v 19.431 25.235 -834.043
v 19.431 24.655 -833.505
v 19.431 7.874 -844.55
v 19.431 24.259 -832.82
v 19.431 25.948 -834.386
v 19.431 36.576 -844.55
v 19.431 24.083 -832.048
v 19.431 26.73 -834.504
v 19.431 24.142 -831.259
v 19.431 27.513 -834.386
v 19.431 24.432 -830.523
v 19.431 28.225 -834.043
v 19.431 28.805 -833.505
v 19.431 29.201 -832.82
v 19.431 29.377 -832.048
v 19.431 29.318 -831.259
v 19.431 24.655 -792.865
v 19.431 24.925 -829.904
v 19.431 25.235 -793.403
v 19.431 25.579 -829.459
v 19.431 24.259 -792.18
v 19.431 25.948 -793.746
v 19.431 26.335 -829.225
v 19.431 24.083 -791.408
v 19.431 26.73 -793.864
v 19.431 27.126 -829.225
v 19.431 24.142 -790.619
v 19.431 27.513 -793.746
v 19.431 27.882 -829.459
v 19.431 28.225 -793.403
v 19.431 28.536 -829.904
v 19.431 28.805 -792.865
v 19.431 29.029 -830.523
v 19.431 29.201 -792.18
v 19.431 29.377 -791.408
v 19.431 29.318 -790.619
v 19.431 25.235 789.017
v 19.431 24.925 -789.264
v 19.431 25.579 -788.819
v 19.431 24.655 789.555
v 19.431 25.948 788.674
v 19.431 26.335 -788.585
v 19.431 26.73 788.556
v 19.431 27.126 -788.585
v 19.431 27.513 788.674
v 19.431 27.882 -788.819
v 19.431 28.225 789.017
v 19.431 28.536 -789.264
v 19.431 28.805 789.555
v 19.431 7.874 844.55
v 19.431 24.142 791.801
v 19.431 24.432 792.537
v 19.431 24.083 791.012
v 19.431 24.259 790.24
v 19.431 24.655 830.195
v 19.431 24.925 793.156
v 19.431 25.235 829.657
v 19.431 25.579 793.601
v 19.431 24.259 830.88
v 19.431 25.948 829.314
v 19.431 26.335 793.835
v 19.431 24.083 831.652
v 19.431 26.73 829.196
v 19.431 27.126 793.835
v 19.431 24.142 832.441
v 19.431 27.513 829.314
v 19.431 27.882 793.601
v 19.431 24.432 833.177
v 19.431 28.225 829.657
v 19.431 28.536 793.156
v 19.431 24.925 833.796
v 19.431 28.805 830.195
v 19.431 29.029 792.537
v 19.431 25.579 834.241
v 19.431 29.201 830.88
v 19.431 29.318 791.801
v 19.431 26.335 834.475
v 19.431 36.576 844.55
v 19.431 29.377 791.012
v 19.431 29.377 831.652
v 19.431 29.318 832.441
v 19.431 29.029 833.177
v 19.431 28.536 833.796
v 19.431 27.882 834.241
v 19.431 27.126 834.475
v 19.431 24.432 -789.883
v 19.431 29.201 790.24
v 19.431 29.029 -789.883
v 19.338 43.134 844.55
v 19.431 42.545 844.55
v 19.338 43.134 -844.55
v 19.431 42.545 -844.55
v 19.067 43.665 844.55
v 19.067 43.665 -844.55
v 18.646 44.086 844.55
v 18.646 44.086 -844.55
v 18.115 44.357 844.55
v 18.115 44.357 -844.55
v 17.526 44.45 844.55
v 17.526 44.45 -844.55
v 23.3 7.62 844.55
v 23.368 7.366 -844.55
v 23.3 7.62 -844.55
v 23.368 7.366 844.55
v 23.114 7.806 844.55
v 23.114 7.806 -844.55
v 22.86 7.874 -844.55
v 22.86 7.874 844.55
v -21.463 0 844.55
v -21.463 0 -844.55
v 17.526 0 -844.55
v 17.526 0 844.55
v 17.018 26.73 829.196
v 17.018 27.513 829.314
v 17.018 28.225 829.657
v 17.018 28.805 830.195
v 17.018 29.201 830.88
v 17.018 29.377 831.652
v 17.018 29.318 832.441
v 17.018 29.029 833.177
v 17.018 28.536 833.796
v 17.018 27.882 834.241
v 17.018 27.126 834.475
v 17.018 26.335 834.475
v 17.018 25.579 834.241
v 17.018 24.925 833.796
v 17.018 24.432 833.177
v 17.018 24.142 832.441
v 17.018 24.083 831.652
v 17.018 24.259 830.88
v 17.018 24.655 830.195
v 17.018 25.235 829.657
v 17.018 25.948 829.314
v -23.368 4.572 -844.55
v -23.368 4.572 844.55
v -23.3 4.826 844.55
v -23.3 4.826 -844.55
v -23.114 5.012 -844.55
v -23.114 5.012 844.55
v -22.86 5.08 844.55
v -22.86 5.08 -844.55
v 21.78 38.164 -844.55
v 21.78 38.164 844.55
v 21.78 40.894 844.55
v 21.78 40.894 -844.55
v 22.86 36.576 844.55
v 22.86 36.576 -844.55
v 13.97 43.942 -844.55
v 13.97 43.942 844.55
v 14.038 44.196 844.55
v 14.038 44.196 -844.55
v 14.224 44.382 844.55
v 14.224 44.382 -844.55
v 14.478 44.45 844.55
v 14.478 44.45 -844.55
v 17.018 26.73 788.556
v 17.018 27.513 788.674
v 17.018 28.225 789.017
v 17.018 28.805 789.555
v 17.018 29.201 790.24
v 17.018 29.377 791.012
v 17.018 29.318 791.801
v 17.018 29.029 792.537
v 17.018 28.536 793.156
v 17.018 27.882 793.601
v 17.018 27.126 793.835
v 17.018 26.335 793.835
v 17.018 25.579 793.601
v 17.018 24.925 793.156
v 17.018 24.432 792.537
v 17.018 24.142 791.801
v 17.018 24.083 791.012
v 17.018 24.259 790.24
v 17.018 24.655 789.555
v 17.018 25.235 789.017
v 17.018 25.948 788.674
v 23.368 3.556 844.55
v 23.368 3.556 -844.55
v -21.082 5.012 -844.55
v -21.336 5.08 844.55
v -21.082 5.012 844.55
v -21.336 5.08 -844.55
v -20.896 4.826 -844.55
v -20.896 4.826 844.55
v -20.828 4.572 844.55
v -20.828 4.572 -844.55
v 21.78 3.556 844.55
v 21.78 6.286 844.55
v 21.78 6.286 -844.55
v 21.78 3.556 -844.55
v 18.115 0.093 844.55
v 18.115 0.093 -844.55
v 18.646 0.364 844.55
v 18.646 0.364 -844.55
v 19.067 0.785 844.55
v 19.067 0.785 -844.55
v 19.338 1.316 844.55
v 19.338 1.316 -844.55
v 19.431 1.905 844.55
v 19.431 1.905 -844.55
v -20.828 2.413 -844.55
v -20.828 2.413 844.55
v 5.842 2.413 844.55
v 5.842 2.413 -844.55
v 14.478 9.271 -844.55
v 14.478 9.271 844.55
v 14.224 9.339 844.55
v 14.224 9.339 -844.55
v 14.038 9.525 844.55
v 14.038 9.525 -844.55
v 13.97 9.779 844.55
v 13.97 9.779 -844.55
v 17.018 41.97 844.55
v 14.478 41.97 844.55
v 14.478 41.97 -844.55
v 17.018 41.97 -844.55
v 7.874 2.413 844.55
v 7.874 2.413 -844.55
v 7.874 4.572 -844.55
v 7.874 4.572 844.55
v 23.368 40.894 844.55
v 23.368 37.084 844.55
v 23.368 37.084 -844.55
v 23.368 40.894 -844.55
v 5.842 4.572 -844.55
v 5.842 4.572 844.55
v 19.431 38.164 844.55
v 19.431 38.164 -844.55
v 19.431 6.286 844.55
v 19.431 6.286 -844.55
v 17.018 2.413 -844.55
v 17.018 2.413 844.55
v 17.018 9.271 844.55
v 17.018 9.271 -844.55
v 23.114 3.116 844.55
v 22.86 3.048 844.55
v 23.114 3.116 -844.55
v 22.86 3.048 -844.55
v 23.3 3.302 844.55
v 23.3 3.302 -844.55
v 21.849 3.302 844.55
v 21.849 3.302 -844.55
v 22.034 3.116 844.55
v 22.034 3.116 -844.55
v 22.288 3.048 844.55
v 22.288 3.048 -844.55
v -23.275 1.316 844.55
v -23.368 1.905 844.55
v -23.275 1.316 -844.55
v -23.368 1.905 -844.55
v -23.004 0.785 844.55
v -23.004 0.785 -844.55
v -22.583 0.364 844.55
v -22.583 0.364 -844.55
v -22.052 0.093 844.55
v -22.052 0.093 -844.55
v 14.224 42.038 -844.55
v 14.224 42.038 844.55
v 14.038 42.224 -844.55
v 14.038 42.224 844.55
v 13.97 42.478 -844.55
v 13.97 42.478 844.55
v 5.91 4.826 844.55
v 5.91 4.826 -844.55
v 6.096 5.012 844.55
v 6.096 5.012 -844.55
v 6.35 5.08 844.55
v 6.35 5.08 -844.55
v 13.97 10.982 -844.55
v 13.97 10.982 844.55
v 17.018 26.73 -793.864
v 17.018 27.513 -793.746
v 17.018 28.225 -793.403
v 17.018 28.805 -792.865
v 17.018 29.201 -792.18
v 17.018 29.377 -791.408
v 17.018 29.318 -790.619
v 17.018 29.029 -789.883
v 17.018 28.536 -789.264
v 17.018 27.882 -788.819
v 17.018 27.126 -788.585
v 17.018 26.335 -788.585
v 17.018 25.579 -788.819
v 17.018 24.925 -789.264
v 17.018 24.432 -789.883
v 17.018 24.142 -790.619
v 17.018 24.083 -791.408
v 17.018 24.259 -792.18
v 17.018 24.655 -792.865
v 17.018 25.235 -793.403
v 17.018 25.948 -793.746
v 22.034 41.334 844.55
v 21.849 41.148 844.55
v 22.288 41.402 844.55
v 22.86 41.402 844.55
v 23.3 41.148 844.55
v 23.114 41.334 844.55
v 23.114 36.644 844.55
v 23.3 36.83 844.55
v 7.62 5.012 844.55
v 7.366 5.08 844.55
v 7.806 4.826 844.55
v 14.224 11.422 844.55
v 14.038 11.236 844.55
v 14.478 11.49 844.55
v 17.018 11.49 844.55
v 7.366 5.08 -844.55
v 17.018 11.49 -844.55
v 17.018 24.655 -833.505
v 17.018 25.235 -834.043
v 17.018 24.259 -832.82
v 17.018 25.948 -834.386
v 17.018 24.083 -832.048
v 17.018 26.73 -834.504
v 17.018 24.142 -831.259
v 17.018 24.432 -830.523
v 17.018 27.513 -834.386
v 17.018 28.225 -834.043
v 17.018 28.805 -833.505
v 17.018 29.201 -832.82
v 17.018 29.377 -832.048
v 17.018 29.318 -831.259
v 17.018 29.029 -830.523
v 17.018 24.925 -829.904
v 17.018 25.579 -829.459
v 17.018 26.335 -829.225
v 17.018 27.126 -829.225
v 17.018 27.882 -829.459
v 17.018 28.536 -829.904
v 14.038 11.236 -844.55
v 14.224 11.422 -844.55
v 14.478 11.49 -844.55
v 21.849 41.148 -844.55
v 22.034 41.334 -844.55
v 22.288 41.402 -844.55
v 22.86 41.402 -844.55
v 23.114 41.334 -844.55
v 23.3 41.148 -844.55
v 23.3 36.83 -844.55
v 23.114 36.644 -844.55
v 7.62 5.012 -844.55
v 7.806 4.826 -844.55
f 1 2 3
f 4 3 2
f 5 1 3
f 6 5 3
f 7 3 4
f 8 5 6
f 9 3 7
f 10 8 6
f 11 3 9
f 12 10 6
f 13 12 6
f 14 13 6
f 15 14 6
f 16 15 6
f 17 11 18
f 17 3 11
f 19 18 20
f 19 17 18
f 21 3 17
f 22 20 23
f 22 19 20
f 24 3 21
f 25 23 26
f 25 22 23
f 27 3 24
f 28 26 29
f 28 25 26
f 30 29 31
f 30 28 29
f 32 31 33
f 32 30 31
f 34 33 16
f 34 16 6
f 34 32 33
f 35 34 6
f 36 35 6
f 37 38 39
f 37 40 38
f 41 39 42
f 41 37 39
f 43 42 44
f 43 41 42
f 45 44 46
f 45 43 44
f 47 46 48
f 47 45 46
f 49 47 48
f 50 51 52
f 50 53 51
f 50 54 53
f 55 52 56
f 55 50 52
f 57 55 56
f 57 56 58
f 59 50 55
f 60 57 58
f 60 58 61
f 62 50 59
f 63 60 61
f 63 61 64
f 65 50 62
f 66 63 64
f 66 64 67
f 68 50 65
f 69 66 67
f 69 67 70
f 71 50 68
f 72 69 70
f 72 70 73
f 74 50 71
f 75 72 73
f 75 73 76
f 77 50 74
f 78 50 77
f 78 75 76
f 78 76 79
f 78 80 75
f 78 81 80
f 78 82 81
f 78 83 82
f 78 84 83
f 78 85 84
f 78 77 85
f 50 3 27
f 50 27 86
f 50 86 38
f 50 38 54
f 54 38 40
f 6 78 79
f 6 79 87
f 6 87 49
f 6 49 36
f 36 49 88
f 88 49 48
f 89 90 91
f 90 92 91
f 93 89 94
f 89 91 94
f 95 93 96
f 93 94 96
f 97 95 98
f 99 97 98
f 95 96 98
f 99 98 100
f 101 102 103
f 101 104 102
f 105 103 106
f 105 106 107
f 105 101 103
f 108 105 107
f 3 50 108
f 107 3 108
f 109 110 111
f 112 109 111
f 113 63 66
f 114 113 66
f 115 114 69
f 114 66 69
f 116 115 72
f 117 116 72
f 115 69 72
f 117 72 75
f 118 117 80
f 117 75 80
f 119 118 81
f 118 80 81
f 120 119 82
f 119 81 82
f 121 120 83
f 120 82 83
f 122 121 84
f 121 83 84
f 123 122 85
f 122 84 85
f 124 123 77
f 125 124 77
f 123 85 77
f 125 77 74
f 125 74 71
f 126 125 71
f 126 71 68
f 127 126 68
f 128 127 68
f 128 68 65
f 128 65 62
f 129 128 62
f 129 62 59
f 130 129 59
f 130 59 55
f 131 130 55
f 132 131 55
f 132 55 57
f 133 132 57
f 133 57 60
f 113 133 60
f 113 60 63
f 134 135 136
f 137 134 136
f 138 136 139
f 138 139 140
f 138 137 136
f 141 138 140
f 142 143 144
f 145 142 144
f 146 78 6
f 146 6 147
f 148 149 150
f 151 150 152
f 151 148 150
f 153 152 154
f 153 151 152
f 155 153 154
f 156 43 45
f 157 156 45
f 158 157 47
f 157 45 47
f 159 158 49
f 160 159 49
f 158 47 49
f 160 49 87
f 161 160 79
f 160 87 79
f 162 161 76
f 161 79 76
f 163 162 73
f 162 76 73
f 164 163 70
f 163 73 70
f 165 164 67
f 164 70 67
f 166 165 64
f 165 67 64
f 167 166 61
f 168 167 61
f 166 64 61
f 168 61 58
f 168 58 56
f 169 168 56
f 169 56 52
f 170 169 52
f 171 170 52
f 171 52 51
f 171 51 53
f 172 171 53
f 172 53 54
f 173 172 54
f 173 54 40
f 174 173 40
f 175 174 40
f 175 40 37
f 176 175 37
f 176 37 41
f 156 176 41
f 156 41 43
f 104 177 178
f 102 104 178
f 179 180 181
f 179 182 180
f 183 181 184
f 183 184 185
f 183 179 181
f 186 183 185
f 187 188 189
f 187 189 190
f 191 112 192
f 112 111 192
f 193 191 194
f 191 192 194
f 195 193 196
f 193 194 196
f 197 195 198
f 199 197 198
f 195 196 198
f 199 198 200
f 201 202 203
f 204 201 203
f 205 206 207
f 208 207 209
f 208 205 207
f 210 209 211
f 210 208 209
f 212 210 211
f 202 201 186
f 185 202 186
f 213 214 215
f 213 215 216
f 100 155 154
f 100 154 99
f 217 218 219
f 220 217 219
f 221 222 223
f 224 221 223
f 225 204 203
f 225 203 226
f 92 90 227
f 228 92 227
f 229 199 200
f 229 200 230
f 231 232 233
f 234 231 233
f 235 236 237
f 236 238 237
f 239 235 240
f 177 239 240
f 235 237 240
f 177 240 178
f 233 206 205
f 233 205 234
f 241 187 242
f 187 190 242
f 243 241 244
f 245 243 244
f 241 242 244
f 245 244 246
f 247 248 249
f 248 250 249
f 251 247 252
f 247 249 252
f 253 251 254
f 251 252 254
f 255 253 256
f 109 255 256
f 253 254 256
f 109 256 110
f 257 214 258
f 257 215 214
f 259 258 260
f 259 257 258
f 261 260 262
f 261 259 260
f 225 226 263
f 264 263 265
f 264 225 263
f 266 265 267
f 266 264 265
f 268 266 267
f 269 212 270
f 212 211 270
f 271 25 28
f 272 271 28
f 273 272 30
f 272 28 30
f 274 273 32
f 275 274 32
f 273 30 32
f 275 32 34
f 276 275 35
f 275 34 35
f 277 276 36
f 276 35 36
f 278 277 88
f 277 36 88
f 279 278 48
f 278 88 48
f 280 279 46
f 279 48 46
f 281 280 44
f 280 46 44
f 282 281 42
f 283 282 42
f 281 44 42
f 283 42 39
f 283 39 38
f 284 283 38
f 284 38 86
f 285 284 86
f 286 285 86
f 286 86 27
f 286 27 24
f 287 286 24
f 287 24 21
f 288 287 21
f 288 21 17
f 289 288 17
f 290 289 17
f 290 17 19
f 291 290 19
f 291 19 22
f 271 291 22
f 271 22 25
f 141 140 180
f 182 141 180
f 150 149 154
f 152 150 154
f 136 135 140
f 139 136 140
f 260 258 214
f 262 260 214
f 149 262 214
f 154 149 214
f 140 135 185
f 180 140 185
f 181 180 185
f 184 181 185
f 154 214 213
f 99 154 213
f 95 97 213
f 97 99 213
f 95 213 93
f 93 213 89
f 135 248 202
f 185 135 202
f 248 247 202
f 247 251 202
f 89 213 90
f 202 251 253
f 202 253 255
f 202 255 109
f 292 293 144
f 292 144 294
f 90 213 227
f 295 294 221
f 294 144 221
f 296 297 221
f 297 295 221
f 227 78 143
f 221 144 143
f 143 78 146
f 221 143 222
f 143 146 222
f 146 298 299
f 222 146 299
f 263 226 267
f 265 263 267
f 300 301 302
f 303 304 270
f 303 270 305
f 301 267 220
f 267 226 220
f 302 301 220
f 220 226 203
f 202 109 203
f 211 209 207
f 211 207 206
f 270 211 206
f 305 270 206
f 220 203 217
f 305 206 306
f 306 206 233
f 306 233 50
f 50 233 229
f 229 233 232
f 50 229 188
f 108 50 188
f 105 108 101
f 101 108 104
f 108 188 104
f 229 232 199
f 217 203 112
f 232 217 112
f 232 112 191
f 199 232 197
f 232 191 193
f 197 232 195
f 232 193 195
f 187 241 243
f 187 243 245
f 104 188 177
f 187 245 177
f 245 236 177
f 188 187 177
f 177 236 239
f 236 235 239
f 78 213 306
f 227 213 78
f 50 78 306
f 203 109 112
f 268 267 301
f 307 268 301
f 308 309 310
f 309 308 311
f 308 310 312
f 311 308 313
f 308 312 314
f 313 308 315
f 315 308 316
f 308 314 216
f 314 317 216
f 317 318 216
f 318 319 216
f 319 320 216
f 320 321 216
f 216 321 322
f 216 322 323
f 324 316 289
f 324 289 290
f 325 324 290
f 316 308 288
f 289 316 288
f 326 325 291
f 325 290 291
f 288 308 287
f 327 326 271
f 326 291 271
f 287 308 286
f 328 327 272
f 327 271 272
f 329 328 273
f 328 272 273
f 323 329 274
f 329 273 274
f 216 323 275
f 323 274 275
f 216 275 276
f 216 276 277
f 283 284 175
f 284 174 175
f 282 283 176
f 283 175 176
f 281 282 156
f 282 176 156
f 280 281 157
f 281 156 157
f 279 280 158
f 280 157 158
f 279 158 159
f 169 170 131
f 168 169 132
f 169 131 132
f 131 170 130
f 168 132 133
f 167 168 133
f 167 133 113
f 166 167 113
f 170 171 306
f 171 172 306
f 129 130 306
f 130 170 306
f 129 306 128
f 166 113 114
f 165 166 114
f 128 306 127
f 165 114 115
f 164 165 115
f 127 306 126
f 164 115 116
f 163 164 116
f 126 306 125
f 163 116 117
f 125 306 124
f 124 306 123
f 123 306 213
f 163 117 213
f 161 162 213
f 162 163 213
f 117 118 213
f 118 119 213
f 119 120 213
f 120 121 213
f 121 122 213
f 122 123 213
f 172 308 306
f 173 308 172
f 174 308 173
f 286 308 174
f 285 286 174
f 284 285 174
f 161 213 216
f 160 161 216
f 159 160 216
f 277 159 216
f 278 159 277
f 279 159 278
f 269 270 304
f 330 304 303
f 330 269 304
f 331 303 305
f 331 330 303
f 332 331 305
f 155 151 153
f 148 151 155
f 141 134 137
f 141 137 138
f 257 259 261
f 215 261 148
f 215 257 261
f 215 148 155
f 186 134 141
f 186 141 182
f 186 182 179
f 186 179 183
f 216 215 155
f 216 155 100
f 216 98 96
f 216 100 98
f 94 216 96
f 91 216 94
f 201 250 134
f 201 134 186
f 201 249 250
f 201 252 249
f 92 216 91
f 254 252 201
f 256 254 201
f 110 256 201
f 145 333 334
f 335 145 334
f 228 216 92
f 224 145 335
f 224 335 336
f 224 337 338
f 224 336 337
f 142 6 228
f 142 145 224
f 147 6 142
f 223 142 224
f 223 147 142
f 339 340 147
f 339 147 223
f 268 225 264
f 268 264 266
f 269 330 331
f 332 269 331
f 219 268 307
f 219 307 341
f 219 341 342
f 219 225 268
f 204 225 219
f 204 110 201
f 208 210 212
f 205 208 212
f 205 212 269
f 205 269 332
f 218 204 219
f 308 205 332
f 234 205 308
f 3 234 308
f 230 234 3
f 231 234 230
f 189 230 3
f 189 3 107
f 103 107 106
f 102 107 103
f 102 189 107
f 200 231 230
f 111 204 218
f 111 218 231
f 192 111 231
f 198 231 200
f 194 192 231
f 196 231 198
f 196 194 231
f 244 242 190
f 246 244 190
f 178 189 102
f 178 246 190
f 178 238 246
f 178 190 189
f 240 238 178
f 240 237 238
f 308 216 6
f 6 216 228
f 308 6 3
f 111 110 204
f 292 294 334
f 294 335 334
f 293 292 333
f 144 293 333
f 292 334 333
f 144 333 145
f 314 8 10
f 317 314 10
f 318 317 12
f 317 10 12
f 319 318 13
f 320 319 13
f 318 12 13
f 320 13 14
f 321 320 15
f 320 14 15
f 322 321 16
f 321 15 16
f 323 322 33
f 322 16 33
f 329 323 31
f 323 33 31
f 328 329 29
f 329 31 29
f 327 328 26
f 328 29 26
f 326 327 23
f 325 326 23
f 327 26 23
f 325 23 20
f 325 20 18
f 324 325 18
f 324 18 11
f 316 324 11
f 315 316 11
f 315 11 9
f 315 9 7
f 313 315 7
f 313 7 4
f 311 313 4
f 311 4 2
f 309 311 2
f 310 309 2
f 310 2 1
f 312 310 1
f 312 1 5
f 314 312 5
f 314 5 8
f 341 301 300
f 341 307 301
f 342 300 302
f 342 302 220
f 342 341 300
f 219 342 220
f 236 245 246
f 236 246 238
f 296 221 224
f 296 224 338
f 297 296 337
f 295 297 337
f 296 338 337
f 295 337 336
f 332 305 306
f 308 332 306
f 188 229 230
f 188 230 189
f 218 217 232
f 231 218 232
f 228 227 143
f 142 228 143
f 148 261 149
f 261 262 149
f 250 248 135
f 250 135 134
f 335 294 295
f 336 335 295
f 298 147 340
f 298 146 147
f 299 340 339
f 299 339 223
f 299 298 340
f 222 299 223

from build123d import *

# Parameters (mm, degrees)
MAIN_W                 = 46.736
MAIN_H                 = 1689.1
EXTRUDE_MAIN_DEPTH     = 44.45
MAIN_CUT_W             = 37.338
MAIN_CUT_H             = 39.37
CUT_MAIN_DEPTH         = 1690.846346839
BOTTOM_LEFT_W          = 26.67
BOTTOM_LEFT_H          = 2.667
CUT_BOTTOM_LEFT_DEPTH  = 1690.846346839
BOTTOM_RIGHT_W         = 6.096
BOTTOM_RIGHT_H         = 2.667
CUT_BOTTOM_RIGHT_DEPTH = 1690.846346839
LEFT_BOTTOM_W          = 3.048
LEFT_BOTTOM_H          = 6.858
CUT_LEFT_BOTTOM_DEPTH  = 1690.846346839
LEFT_MIDDLE_W          = 3.048
LEFT_MIDDLE_H          = 30.48
CUT_LEFT_MID_DEPTH     = 1690.846346839
RIGHT_MIDDLE_W         = 7.874
RIGHT_MIDDLE_H         = 28.702
CUT_RIGHT_MID_DEPTH    = 1690.846346839
HOOK_CUT_DEPTH         = 1690.846346839
FILLET3_R              = 1.905
FILLET4_R              = 0.508
SCREW_HOLES_D          = 5.3086


with BuildPart() as part:
    # Main → Extrude-Main (new body)
    with BuildSketch(Plane(origin=(0, 0, 0), x_dir=(1, 0, 0), z_dir=(0, 1, 0))):
        Rectangle(MAIN_W, MAIN_H)
    extrude(amount=EXTRUDE_MAIN_DEPTH)

    # Main Cut → Cut-Main (cut, through all)
    with BuildSketch(Plane.XY.offset(844.55)):
        with Locations((-4.699, 24.765)):
            Rectangle(MAIN_CUT_W, MAIN_CUT_H)
    extrude(amount=-CUT_MAIN_DEPTH, mode=Mode.SUBTRACT)

    # Bottom Left → Cut-Bottom Left (cut, through all)
    with BuildSketch(Plane.XY.offset(844.55)):
        with Locations((-7.493, 3.7465)):
            Rectangle(BOTTOM_LEFT_W, BOTTOM_LEFT_H)
    extrude(amount=-CUT_BOTTOM_LEFT_DEPTH, mode=Mode.SUBTRACT)

    # Bottom Right → Cut-Bottom Right (cut, through all)
    with BuildSketch(Plane.XY.offset(844.55)):
        with Locations((10.922, 3.7465)):
            Rectangle(BOTTOM_RIGHT_W, BOTTOM_RIGHT_H)
    extrude(amount=-CUT_BOTTOM_RIGHT_DEPTH, mode=Mode.SUBTRACT)

    # Left Bottom → Cut-Left Bottom (cut, through all)
    with BuildSketch(Plane.XY.offset(844.55)):
        with Locations((15.494, 5.842)):
            Rectangle(LEFT_BOTTOM_W, LEFT_BOTTOM_H)
    extrude(amount=-CUT_LEFT_BOTTOM_DEPTH, mode=Mode.SUBTRACT)

    # Left Middle → Cut-Left Mid (cut, through all)
    with BuildSketch(Plane.XY.offset(844.55)):
        with Locations((15.494, 26.730206209)):
            Rectangle(LEFT_MIDDLE_W, LEFT_MIDDLE_H)
    extrude(amount=-CUT_LEFT_MID_DEPTH, mode=Mode.SUBTRACT)

    # Right Middle → Cut-Right Mid (cut, through all)
    with BuildSketch(Plane.XY.offset(844.55)):
        with Locations((23.368, 22.225)):
            Rectangle(RIGHT_MIDDLE_W, RIGHT_MIDDLE_H)
    extrude(amount=-CUT_RIGHT_MID_DEPTH, mode=Mode.SUBTRACT)

    # Hooks → Hook Cut (cut, through all)
    with BuildSketch(Plane.XY.offset(844.55)):
        Polygon((19.431, 44.45), (19.431, 38.1635), (21.7805, 38.1635), (21.7805, 41.402), (23.368, 41.402), (23.368, 44.45), align=None)
        Polygon((23.368, 3.048), (23.368, 0), (19.431, 0), (19.431, 6.2865), (21.7805, 6.2865), (21.7805, 3.048), align=None)
    extrude(amount=-HOOK_CUT_DEPTH, mode=Mode.SUBTRACT)

    # Fillet3
    fillet3_edges = [part.edges().sort_by_distance(p)[0] for p in [
        (19.431, 44.45, 0),
        (19.431, 0, 0),
        (-23.368, 0, 0),
    ]]
    fillet(fillet3_edges, radius=FILLET3_R)

    # Fillet4
    fillet4_edges = [part.edges().sort_by_distance(p)[0] for p in [
        (23.368, 41.402, 0),
        (21.7805, 41.402, 0),
        (21.7805, 3.048, 0),
        (23.368, 3.048, 0),
        (-23.368, 5.08, 0),
        (13.97, 44.45, 0),
        (-20.828, 5.08, 0),
        (5.842, 5.08, 0),
        (7.874, 5.08, 0),
        (13.97, 9.271, 0),
        (13.97, 11.490206209, 0),
        (13.97, 41.970206209, 0),
        (23.368, 36.576, 0),
        (23.368, 7.874, 0),
    ]]
    fillet(fillet4_edges, radius=FILLET4_R)

    # Screw Holes (through all)
    with Locations(Plane.ZY.offset(-17.018)):
        with Locations((-791.21, 26.730206209), (831.85, 26.730206209), (791.21, 26.730206209), (-831.85, 26.730206209)):
            Hole(SCREW_HOLES_D / 2)


solid = part.part
